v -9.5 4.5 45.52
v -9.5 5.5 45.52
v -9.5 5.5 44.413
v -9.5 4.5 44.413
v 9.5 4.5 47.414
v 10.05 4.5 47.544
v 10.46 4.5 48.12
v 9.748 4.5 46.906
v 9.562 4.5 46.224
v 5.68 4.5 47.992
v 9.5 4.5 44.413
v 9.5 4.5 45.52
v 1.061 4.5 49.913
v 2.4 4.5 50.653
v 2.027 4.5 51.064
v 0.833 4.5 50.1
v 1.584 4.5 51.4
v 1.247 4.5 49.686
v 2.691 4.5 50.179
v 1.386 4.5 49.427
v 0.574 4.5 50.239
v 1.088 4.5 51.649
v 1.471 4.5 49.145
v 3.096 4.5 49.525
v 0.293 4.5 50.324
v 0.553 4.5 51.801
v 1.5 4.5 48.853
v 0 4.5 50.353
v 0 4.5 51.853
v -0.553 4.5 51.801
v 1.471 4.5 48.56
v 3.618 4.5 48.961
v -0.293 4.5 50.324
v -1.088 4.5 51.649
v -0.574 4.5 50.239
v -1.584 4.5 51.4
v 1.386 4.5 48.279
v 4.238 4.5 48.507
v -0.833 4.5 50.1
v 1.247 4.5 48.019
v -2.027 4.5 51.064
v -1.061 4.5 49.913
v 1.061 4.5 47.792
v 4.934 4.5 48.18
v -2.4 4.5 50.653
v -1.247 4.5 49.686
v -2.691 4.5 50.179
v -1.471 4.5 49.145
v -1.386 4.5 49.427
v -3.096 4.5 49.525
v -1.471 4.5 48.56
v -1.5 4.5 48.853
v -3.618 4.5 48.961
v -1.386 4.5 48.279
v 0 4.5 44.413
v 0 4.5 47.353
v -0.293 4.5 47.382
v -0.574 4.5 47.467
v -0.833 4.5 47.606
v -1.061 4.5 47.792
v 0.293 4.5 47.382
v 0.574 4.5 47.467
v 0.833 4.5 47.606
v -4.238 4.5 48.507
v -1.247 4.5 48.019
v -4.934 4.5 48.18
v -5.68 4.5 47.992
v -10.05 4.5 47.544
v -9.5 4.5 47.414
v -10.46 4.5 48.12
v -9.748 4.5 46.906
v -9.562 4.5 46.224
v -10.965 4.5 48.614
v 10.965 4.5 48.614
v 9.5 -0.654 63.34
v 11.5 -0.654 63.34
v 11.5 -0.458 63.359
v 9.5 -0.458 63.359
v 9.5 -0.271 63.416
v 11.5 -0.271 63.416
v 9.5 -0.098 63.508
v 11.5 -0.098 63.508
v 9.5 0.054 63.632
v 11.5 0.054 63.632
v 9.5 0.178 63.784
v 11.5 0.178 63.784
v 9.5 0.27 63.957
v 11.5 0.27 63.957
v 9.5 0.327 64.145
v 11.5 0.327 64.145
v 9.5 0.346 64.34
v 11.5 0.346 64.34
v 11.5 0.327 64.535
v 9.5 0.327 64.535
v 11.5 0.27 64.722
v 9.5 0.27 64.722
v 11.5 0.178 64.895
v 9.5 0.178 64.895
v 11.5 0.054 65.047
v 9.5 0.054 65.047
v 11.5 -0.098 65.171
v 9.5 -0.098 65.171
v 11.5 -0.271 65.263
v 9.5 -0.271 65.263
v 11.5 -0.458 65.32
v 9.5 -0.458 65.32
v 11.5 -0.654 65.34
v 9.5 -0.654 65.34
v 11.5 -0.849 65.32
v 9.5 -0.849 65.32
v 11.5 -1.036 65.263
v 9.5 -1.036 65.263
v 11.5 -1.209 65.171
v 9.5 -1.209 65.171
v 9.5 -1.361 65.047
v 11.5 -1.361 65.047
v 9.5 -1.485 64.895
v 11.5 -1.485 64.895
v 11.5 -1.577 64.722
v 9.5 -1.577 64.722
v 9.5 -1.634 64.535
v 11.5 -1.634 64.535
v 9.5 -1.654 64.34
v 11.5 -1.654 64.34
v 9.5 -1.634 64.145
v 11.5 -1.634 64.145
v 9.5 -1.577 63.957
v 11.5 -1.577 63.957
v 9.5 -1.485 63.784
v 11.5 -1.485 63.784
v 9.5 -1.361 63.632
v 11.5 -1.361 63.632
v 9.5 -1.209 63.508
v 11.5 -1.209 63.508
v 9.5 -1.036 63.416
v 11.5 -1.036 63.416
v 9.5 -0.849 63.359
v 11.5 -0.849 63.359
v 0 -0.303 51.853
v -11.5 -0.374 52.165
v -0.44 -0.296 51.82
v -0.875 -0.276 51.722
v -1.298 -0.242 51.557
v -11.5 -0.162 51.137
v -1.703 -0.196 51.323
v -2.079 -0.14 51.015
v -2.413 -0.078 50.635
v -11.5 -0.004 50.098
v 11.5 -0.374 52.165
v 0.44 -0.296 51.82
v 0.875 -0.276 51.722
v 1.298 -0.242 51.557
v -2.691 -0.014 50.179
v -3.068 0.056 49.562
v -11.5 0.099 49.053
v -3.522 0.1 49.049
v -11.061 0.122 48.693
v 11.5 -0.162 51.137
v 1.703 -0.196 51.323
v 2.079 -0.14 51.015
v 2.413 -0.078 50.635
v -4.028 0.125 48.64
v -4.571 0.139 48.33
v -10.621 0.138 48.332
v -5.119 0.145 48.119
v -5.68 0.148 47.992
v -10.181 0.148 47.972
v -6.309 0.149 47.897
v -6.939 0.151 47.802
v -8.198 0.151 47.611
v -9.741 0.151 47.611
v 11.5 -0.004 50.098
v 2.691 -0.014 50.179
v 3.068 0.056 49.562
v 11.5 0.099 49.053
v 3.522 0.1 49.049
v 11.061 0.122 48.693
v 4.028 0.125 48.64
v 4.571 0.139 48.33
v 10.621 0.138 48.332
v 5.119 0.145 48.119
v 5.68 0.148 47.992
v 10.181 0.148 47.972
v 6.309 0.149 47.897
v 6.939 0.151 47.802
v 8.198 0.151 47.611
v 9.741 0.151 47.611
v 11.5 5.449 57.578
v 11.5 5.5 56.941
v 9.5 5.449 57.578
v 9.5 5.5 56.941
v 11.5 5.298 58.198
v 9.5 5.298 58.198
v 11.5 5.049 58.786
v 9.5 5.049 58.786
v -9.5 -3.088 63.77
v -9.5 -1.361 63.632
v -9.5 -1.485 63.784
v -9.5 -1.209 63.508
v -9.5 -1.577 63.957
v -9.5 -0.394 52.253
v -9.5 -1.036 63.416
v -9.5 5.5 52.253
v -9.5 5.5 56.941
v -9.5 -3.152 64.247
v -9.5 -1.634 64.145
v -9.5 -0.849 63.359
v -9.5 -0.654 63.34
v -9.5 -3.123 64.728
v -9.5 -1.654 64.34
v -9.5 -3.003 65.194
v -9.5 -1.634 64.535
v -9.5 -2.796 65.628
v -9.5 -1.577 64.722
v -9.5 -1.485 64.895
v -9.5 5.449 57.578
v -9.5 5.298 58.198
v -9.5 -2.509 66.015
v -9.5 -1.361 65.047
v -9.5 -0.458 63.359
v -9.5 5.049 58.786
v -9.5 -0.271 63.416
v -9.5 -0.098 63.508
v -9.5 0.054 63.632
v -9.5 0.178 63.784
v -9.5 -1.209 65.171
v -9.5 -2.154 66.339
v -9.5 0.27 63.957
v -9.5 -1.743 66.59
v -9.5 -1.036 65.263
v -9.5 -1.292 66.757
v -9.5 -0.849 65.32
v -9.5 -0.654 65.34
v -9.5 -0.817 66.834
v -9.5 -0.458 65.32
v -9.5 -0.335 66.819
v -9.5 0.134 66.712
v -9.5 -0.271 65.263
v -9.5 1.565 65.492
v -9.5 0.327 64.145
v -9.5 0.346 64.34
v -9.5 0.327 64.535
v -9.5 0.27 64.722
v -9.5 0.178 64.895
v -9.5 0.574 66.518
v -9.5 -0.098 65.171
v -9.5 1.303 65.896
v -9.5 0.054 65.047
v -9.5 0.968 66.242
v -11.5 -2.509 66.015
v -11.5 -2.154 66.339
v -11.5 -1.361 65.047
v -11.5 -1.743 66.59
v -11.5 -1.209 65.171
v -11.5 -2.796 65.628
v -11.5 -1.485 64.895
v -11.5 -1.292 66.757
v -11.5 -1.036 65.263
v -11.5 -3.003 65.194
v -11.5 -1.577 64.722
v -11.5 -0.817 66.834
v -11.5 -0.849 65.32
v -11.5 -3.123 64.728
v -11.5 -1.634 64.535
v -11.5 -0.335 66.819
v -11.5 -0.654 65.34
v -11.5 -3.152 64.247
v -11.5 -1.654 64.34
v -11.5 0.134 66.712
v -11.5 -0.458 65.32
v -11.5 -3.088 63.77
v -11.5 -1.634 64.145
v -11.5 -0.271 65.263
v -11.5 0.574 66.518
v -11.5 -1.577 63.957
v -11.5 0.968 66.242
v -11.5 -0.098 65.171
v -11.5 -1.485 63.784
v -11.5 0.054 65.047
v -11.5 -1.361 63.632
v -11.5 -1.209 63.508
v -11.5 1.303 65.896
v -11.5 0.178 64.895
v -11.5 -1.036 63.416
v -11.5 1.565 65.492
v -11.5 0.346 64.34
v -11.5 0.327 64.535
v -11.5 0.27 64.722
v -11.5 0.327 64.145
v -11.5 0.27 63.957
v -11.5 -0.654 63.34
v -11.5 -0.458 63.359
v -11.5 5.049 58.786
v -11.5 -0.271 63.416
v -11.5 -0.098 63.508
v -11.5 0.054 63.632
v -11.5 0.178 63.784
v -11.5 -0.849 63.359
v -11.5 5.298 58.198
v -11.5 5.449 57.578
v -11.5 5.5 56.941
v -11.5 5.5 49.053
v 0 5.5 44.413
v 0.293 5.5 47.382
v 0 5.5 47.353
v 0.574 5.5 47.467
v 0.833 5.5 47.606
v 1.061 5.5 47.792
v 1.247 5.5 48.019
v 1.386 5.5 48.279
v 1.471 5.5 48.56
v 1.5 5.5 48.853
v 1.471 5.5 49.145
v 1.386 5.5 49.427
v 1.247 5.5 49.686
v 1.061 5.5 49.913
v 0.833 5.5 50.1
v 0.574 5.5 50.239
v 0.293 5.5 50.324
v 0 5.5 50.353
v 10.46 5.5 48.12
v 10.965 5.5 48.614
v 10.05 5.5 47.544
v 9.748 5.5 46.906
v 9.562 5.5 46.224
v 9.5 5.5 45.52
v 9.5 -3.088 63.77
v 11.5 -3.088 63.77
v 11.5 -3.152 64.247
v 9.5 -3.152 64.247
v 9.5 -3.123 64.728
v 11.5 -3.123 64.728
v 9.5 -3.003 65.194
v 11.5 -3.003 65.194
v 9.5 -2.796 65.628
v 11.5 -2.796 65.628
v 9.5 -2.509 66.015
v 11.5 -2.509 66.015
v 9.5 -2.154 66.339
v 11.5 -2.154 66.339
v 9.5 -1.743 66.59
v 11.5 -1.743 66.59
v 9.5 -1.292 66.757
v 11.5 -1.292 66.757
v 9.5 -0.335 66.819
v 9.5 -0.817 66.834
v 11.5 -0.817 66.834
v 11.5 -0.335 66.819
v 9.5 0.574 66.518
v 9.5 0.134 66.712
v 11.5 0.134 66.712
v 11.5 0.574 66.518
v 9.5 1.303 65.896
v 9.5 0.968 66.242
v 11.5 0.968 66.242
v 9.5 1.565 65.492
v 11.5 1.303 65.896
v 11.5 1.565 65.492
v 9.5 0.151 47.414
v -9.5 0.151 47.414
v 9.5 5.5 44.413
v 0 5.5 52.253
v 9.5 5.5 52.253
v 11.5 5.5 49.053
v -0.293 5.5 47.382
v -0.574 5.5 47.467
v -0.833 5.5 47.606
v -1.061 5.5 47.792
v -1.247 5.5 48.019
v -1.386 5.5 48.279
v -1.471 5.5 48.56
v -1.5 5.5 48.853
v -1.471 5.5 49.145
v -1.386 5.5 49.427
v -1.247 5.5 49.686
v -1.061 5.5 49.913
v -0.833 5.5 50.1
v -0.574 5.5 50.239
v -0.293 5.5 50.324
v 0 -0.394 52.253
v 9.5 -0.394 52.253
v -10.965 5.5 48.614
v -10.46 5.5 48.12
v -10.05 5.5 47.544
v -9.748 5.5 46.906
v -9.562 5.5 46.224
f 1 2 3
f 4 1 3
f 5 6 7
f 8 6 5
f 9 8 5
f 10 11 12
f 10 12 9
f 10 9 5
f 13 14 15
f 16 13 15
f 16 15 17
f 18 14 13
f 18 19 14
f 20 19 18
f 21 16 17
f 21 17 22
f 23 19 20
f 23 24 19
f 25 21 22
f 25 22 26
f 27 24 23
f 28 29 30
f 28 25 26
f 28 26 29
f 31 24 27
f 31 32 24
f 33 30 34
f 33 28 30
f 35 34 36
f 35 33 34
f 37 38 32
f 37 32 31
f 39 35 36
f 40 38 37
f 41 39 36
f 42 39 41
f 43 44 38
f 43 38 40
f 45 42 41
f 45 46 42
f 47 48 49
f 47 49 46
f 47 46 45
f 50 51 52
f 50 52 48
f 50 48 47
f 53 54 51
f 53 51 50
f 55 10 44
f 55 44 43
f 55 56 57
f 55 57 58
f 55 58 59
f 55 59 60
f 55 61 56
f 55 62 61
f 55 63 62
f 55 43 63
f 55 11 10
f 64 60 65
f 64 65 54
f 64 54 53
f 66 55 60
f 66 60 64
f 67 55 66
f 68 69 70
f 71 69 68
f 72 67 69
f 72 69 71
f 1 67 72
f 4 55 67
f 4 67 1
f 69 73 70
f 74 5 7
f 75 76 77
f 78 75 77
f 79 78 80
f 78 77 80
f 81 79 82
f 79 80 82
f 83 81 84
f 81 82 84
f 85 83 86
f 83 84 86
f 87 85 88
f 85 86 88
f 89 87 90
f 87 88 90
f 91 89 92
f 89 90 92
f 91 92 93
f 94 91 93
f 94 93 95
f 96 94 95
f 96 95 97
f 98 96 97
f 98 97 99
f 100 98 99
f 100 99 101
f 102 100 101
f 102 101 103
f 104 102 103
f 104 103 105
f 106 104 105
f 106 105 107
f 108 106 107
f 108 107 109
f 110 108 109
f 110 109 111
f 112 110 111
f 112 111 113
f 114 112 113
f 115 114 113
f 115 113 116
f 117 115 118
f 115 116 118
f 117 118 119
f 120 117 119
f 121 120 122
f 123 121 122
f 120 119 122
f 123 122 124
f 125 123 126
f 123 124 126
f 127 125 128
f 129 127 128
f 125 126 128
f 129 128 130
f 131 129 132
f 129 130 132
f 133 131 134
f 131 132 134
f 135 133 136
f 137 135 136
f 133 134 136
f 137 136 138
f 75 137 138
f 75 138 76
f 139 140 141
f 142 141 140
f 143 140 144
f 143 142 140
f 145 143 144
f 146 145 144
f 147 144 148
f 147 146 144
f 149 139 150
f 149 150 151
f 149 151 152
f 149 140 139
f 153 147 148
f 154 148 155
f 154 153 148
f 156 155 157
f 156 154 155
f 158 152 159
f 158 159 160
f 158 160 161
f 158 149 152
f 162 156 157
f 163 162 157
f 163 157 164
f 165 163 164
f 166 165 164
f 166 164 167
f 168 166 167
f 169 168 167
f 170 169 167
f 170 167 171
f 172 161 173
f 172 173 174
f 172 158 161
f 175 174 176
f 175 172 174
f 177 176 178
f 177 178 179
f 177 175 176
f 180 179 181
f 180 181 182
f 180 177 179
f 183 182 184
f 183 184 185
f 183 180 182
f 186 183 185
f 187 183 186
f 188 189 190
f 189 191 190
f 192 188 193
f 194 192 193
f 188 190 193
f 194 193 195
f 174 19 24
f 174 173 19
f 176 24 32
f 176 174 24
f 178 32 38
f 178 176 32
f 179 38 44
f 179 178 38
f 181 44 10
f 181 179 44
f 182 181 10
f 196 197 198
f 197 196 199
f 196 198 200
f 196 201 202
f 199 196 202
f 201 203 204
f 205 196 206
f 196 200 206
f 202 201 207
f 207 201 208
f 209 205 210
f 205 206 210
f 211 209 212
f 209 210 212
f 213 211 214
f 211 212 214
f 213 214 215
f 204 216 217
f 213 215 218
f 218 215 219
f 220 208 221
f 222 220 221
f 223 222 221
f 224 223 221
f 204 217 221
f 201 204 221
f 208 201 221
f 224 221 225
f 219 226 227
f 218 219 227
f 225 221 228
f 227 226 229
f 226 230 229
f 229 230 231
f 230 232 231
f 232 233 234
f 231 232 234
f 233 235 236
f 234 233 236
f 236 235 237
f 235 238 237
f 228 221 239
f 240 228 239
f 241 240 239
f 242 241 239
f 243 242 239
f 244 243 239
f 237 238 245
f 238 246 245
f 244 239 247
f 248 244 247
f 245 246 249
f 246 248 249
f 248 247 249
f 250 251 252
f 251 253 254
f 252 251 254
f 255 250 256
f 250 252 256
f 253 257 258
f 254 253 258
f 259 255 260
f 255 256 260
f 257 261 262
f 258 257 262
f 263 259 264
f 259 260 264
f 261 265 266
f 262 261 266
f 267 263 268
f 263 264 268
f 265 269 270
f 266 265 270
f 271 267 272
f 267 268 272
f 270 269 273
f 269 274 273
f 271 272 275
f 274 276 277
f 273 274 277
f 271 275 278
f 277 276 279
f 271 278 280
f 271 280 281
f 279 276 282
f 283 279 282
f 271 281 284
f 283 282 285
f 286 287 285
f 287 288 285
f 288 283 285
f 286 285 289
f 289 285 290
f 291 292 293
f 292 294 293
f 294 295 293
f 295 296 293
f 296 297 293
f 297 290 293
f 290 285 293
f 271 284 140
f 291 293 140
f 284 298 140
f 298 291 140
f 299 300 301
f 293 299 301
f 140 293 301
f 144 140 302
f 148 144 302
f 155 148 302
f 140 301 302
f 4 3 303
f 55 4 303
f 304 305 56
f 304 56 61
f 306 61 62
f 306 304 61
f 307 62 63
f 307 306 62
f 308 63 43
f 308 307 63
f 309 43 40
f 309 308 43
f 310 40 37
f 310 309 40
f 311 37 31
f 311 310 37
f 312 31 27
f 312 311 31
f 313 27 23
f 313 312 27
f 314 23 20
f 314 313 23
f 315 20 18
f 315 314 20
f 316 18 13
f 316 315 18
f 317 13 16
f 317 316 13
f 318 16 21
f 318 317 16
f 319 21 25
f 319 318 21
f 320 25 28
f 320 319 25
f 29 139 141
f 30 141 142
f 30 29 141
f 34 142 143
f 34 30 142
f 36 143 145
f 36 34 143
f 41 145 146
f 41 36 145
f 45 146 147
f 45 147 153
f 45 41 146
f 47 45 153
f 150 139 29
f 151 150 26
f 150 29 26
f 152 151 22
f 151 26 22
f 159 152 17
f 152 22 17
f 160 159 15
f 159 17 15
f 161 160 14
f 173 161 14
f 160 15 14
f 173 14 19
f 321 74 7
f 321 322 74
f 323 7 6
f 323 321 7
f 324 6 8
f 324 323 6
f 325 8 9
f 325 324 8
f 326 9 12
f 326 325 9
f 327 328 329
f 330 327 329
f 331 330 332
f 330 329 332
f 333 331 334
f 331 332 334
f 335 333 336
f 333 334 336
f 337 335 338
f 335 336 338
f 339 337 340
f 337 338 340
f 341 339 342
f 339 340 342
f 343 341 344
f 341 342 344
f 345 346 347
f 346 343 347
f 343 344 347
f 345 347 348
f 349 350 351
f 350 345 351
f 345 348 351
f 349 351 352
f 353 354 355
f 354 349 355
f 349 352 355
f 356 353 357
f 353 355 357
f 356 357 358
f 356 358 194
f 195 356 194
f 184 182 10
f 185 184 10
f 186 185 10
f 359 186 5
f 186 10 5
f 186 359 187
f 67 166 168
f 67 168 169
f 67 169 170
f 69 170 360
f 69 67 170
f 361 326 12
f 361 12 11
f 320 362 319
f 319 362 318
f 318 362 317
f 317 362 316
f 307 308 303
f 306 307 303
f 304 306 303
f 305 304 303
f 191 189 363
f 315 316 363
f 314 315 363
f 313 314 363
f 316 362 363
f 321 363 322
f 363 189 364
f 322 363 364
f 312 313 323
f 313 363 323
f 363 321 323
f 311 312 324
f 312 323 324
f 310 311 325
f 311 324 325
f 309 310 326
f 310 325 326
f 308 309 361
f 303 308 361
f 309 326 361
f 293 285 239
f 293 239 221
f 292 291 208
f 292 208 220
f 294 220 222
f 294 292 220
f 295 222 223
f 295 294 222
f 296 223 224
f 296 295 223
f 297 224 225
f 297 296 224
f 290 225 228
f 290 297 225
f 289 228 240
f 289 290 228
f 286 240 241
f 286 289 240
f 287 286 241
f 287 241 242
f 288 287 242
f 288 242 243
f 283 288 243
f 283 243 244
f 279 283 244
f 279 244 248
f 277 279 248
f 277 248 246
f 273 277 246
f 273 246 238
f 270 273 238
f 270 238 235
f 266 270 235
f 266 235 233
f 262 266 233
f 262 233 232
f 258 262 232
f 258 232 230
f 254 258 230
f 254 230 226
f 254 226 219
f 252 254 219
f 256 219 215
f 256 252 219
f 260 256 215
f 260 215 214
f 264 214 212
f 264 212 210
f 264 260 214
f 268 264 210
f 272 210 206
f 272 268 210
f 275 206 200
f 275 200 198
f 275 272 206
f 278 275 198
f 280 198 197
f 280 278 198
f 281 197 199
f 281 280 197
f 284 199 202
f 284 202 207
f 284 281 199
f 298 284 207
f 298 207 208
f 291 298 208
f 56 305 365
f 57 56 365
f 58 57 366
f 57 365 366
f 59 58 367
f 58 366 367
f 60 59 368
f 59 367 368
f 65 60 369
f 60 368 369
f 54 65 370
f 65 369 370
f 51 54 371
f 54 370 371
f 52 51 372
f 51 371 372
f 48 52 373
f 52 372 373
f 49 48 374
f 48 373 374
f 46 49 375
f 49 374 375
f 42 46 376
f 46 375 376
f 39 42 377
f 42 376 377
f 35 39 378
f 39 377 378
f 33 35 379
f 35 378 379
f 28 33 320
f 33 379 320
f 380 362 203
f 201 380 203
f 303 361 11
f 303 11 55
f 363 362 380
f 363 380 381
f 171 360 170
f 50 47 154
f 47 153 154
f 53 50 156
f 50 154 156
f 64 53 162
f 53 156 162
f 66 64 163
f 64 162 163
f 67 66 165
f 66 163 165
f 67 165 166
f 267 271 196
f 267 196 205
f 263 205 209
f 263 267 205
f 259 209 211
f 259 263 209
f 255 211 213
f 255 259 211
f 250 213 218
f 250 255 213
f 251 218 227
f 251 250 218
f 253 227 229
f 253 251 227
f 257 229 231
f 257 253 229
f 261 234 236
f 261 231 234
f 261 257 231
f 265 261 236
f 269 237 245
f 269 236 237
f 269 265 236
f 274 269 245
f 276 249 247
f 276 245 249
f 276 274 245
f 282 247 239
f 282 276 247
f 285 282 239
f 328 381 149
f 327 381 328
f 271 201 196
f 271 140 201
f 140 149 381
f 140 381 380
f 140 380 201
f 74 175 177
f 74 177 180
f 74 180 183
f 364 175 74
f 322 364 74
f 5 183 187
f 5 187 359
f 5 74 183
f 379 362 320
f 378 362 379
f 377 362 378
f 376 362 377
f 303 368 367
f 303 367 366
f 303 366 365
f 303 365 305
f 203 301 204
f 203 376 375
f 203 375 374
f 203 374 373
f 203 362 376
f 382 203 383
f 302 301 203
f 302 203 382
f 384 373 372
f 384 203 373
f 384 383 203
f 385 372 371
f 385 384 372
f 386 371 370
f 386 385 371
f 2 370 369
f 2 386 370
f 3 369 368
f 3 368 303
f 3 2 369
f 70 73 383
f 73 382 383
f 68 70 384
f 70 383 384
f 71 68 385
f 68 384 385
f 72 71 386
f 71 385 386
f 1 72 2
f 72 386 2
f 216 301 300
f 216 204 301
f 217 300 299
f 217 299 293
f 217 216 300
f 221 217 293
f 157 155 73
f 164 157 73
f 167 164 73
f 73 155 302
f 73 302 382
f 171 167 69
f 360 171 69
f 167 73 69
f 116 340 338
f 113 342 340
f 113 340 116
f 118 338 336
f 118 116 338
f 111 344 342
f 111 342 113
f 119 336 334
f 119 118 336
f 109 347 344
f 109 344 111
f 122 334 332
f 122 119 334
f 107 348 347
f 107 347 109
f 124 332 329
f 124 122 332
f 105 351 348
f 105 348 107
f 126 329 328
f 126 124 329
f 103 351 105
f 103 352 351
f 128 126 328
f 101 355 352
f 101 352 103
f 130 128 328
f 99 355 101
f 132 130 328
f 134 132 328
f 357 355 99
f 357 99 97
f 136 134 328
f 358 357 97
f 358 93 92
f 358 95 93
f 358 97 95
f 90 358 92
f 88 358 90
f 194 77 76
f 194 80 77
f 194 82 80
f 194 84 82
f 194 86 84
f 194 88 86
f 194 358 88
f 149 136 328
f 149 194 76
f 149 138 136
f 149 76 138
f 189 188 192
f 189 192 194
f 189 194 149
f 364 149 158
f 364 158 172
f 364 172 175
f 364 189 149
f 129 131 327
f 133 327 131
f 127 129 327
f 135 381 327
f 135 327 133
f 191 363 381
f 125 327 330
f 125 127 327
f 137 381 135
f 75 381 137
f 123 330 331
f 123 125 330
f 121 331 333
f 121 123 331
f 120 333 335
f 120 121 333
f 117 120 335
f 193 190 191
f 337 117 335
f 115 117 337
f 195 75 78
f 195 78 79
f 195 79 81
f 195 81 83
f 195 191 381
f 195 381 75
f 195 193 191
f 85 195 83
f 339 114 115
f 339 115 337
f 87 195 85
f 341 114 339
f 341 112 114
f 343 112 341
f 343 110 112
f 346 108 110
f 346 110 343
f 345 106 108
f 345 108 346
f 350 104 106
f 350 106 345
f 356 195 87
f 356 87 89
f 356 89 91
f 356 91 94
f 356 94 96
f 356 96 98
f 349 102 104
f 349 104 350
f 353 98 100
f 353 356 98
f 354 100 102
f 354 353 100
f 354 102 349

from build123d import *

# Parameters (mm, degrees)
EXTRUDE_1_DEPTH          = 20
EXTRUDE_1_DEPTH_BACK     = 5
EXTRUDE_2_DEPTH          = 5.5
SKETCH_1_5_R             = 1.5
CUT_EXTRUDE_1_DEPTH      = 4.5
CUT_EXTRUDE_1_DEPTH_BACK = 2
SKETCH_3_R               = 1
CUT_EXTRUDE_2_DEPTH      = 100
FILLET_3_R               = 20
FILLET_8_R               = 4


with BuildPart() as part:
    # 草图1 → 凸台-拉伸1 (new body, two sides)
    with BuildSketch(Plane(origin=(0, 0, 0), x_dir=(1, 0, 0), z_dir=(0, 1, 0))) as extrude_1_sk:
        with BuildLine():
            Line((0, -51.852813742), (0, -52.252813742))
            Line((0, -52.252813742), (9.5, -52.252813742))
            Line((9.5, -52.252813742), (9.5, -70.252813742))
            Line((9.5, -70.252813742), (11.5, -70.252813742))
            Line((11.5, -70.252813742), (11.5, -49.052813742))
            Line((11.5, -49.052813742), (9.5, -47.413831048))
            Line((9.5, -47.413831048), (9.5, -44.41312259))
            Line((9.5, -44.41312259), (0, -44.41312259))
            Line((0, -44.41312259), (0, -47.352813742))
            ThreePointArc((0, -47.352813742), (1.5, -48.852813742), (0, -50.352813742))
            Line((0, -50.352813742), (0, -51.852813742))
        make_face()
    extrude(amount=EXTRUDE_1_DEPTH)
    extrude(extrude_1_sk.sketch, amount=-EXTRUDE_1_DEPTH_BACK)

    # 草图1<7> → 凸台-拉伸2 (add)
    with BuildSketch(Plane(origin=(0, 0, 0), x_dir=(1, 0, 0), z_dir=(0, 1, 0))):
        with BuildLine():
            Line((0, -50.352813742), (0, -51.852813742))
            ThreePointArc((0, -51.852813742), (2.274628745, -50.808846481), (2.966165528, -48.403523125))
            Line((2.966165528, -48.403523125), (9.5, -47.413831048))
            Line((9.5, -47.413831048), (9.5, -44.41312259))
            Line((9.5, -44.41312259), (0, -44.41312259))
            Line((0, -44.41312259), (0, -47.352813742))
            ThreePointArc((0, -47.352813742), (1.5, -48.852813742), (0, -50.352813742))
        make_face()
    extrude(amount=EXTRUDE_2_DEPTH)

    # 草图1<5> → 切除-拉伸1 (cut, two sides)
    with BuildSketch(Plane(origin=(0, 0, 0), x_dir=(1, 0, 0), z_dir=(0, 1, 0))) as cut_extrude_1_sk:
        with BuildLine():
            Line((0, -50.352813742), (0, -51.852813742))
            ThreePointArc((0, -51.852813742), (2.274628745, -50.808846481), (2.966165528, -48.403523125))
            Line((2.966165528, -48.403523125), (9.5, -47.413831048))
            Line((9.5, -47.413831048), (9.5, -44.41312259))
            Line((9.5, -44.41312259), (0, -44.41312259))
            Line((0, -44.41312259), (0, -47.352813742))
            ThreePointArc((0, -47.352813742), (1.5, -48.852813742), (0, -50.352813742))
        make_face()
        with BuildLine():
            Line((0, -26.352813742), (0, -29.352813742))
            Line((0, -29.352813742), (10, -29.352813742))
            ThreePointArc((10, -29.352813742), (12.121320344, -24.231493399), (7, -26.352813742))
            Line((7, -26.352813742), (0, -26.352813742))
        make_face()
        with Locations((10, -26.352813742)):
            Circle(SKETCH_1_5_R, mode=Mode.SUBTRACT)
    extrude(amount=CUT_EXTRUDE_1_DEPTH, mode=Mode.SUBTRACT)
    extrude(cut_extrude_1_sk.sketch, amount=-CUT_EXTRUDE_1_DEPTH_BACK, mode=Mode.SUBTRACT)

    # 草图3 → 切除-拉伸2 (cut)
    with BuildSketch(Plane(origin=(11.5, 0, 0), x_dir=(0, 0, -1), z_dir=(1, 0, 0))):
        with BuildLine():
            Line((-57.918477605, 5.5), (-42.203980761, 5.5))
            Line((-42.203980761, 5.5), (-40.897963641, 24.166318072))
            Line((-40.897963641, 24.166318072), (-83.266559668, 28.095474909))
            Line((-83.266559668, 28.095474909), (-85.239587029, -9.794237843))
            Line((-85.239587029, -9.794237843), (-43.684715074, -5.18920723))
            Line((-43.684715074, -5.18920723), (-42.964099773, 0.151496704))
            Line((-42.964099773, 0.151496704), (-49.918517235, 0.151496704))
            Line((-49.918517235, 0.151496704), (-63.77029754, -3.087900575))
            ThreePointArc((-63.77029754, -3.087900575), (-66.684209706, -1.521268022), (-65.492240114, 1.56489953))
            Line((-65.492240114, 1.56489953), (-57.918477605, 5.5))
        make_face()
        with Locations((-64.339596777, -0.653556379)):
            Circle(SKETCH_3_R)
    extrude(amount=-CUT_EXTRUDE_2_DEPTH, mode=Mode.SUBTRACT)

    # 圆角3
    fillet_3_edges = [part.edges().sort_by_distance(p)[0] for p in [
        (7.152165831, 0.151496704, 49.918517235),
    ]]
    fillet(fillet_3_edges, radius=FILLET_3_R)

    # 圆角8
    fillet_8_edges = [part.edges().sort_by_distance(p)[0] for p in [
        (2.966165528, 2.317894753, 48.403523125),
        (9.5, 5, 47.413831048),
        (10.5, 5.5, 57.918477605),
    ]]
    fillet(fillet_8_edges, radius=FILLET_8_R)

    # 镜向1: part across plane


with BuildPart() as part_1:
    add(part.part)
    add(part.part.mirror(Plane(origin=(0, -5, 0), x_dir=(0, 0, 1), z_dir=(1, 0, 0))))


solid = part_1.part
